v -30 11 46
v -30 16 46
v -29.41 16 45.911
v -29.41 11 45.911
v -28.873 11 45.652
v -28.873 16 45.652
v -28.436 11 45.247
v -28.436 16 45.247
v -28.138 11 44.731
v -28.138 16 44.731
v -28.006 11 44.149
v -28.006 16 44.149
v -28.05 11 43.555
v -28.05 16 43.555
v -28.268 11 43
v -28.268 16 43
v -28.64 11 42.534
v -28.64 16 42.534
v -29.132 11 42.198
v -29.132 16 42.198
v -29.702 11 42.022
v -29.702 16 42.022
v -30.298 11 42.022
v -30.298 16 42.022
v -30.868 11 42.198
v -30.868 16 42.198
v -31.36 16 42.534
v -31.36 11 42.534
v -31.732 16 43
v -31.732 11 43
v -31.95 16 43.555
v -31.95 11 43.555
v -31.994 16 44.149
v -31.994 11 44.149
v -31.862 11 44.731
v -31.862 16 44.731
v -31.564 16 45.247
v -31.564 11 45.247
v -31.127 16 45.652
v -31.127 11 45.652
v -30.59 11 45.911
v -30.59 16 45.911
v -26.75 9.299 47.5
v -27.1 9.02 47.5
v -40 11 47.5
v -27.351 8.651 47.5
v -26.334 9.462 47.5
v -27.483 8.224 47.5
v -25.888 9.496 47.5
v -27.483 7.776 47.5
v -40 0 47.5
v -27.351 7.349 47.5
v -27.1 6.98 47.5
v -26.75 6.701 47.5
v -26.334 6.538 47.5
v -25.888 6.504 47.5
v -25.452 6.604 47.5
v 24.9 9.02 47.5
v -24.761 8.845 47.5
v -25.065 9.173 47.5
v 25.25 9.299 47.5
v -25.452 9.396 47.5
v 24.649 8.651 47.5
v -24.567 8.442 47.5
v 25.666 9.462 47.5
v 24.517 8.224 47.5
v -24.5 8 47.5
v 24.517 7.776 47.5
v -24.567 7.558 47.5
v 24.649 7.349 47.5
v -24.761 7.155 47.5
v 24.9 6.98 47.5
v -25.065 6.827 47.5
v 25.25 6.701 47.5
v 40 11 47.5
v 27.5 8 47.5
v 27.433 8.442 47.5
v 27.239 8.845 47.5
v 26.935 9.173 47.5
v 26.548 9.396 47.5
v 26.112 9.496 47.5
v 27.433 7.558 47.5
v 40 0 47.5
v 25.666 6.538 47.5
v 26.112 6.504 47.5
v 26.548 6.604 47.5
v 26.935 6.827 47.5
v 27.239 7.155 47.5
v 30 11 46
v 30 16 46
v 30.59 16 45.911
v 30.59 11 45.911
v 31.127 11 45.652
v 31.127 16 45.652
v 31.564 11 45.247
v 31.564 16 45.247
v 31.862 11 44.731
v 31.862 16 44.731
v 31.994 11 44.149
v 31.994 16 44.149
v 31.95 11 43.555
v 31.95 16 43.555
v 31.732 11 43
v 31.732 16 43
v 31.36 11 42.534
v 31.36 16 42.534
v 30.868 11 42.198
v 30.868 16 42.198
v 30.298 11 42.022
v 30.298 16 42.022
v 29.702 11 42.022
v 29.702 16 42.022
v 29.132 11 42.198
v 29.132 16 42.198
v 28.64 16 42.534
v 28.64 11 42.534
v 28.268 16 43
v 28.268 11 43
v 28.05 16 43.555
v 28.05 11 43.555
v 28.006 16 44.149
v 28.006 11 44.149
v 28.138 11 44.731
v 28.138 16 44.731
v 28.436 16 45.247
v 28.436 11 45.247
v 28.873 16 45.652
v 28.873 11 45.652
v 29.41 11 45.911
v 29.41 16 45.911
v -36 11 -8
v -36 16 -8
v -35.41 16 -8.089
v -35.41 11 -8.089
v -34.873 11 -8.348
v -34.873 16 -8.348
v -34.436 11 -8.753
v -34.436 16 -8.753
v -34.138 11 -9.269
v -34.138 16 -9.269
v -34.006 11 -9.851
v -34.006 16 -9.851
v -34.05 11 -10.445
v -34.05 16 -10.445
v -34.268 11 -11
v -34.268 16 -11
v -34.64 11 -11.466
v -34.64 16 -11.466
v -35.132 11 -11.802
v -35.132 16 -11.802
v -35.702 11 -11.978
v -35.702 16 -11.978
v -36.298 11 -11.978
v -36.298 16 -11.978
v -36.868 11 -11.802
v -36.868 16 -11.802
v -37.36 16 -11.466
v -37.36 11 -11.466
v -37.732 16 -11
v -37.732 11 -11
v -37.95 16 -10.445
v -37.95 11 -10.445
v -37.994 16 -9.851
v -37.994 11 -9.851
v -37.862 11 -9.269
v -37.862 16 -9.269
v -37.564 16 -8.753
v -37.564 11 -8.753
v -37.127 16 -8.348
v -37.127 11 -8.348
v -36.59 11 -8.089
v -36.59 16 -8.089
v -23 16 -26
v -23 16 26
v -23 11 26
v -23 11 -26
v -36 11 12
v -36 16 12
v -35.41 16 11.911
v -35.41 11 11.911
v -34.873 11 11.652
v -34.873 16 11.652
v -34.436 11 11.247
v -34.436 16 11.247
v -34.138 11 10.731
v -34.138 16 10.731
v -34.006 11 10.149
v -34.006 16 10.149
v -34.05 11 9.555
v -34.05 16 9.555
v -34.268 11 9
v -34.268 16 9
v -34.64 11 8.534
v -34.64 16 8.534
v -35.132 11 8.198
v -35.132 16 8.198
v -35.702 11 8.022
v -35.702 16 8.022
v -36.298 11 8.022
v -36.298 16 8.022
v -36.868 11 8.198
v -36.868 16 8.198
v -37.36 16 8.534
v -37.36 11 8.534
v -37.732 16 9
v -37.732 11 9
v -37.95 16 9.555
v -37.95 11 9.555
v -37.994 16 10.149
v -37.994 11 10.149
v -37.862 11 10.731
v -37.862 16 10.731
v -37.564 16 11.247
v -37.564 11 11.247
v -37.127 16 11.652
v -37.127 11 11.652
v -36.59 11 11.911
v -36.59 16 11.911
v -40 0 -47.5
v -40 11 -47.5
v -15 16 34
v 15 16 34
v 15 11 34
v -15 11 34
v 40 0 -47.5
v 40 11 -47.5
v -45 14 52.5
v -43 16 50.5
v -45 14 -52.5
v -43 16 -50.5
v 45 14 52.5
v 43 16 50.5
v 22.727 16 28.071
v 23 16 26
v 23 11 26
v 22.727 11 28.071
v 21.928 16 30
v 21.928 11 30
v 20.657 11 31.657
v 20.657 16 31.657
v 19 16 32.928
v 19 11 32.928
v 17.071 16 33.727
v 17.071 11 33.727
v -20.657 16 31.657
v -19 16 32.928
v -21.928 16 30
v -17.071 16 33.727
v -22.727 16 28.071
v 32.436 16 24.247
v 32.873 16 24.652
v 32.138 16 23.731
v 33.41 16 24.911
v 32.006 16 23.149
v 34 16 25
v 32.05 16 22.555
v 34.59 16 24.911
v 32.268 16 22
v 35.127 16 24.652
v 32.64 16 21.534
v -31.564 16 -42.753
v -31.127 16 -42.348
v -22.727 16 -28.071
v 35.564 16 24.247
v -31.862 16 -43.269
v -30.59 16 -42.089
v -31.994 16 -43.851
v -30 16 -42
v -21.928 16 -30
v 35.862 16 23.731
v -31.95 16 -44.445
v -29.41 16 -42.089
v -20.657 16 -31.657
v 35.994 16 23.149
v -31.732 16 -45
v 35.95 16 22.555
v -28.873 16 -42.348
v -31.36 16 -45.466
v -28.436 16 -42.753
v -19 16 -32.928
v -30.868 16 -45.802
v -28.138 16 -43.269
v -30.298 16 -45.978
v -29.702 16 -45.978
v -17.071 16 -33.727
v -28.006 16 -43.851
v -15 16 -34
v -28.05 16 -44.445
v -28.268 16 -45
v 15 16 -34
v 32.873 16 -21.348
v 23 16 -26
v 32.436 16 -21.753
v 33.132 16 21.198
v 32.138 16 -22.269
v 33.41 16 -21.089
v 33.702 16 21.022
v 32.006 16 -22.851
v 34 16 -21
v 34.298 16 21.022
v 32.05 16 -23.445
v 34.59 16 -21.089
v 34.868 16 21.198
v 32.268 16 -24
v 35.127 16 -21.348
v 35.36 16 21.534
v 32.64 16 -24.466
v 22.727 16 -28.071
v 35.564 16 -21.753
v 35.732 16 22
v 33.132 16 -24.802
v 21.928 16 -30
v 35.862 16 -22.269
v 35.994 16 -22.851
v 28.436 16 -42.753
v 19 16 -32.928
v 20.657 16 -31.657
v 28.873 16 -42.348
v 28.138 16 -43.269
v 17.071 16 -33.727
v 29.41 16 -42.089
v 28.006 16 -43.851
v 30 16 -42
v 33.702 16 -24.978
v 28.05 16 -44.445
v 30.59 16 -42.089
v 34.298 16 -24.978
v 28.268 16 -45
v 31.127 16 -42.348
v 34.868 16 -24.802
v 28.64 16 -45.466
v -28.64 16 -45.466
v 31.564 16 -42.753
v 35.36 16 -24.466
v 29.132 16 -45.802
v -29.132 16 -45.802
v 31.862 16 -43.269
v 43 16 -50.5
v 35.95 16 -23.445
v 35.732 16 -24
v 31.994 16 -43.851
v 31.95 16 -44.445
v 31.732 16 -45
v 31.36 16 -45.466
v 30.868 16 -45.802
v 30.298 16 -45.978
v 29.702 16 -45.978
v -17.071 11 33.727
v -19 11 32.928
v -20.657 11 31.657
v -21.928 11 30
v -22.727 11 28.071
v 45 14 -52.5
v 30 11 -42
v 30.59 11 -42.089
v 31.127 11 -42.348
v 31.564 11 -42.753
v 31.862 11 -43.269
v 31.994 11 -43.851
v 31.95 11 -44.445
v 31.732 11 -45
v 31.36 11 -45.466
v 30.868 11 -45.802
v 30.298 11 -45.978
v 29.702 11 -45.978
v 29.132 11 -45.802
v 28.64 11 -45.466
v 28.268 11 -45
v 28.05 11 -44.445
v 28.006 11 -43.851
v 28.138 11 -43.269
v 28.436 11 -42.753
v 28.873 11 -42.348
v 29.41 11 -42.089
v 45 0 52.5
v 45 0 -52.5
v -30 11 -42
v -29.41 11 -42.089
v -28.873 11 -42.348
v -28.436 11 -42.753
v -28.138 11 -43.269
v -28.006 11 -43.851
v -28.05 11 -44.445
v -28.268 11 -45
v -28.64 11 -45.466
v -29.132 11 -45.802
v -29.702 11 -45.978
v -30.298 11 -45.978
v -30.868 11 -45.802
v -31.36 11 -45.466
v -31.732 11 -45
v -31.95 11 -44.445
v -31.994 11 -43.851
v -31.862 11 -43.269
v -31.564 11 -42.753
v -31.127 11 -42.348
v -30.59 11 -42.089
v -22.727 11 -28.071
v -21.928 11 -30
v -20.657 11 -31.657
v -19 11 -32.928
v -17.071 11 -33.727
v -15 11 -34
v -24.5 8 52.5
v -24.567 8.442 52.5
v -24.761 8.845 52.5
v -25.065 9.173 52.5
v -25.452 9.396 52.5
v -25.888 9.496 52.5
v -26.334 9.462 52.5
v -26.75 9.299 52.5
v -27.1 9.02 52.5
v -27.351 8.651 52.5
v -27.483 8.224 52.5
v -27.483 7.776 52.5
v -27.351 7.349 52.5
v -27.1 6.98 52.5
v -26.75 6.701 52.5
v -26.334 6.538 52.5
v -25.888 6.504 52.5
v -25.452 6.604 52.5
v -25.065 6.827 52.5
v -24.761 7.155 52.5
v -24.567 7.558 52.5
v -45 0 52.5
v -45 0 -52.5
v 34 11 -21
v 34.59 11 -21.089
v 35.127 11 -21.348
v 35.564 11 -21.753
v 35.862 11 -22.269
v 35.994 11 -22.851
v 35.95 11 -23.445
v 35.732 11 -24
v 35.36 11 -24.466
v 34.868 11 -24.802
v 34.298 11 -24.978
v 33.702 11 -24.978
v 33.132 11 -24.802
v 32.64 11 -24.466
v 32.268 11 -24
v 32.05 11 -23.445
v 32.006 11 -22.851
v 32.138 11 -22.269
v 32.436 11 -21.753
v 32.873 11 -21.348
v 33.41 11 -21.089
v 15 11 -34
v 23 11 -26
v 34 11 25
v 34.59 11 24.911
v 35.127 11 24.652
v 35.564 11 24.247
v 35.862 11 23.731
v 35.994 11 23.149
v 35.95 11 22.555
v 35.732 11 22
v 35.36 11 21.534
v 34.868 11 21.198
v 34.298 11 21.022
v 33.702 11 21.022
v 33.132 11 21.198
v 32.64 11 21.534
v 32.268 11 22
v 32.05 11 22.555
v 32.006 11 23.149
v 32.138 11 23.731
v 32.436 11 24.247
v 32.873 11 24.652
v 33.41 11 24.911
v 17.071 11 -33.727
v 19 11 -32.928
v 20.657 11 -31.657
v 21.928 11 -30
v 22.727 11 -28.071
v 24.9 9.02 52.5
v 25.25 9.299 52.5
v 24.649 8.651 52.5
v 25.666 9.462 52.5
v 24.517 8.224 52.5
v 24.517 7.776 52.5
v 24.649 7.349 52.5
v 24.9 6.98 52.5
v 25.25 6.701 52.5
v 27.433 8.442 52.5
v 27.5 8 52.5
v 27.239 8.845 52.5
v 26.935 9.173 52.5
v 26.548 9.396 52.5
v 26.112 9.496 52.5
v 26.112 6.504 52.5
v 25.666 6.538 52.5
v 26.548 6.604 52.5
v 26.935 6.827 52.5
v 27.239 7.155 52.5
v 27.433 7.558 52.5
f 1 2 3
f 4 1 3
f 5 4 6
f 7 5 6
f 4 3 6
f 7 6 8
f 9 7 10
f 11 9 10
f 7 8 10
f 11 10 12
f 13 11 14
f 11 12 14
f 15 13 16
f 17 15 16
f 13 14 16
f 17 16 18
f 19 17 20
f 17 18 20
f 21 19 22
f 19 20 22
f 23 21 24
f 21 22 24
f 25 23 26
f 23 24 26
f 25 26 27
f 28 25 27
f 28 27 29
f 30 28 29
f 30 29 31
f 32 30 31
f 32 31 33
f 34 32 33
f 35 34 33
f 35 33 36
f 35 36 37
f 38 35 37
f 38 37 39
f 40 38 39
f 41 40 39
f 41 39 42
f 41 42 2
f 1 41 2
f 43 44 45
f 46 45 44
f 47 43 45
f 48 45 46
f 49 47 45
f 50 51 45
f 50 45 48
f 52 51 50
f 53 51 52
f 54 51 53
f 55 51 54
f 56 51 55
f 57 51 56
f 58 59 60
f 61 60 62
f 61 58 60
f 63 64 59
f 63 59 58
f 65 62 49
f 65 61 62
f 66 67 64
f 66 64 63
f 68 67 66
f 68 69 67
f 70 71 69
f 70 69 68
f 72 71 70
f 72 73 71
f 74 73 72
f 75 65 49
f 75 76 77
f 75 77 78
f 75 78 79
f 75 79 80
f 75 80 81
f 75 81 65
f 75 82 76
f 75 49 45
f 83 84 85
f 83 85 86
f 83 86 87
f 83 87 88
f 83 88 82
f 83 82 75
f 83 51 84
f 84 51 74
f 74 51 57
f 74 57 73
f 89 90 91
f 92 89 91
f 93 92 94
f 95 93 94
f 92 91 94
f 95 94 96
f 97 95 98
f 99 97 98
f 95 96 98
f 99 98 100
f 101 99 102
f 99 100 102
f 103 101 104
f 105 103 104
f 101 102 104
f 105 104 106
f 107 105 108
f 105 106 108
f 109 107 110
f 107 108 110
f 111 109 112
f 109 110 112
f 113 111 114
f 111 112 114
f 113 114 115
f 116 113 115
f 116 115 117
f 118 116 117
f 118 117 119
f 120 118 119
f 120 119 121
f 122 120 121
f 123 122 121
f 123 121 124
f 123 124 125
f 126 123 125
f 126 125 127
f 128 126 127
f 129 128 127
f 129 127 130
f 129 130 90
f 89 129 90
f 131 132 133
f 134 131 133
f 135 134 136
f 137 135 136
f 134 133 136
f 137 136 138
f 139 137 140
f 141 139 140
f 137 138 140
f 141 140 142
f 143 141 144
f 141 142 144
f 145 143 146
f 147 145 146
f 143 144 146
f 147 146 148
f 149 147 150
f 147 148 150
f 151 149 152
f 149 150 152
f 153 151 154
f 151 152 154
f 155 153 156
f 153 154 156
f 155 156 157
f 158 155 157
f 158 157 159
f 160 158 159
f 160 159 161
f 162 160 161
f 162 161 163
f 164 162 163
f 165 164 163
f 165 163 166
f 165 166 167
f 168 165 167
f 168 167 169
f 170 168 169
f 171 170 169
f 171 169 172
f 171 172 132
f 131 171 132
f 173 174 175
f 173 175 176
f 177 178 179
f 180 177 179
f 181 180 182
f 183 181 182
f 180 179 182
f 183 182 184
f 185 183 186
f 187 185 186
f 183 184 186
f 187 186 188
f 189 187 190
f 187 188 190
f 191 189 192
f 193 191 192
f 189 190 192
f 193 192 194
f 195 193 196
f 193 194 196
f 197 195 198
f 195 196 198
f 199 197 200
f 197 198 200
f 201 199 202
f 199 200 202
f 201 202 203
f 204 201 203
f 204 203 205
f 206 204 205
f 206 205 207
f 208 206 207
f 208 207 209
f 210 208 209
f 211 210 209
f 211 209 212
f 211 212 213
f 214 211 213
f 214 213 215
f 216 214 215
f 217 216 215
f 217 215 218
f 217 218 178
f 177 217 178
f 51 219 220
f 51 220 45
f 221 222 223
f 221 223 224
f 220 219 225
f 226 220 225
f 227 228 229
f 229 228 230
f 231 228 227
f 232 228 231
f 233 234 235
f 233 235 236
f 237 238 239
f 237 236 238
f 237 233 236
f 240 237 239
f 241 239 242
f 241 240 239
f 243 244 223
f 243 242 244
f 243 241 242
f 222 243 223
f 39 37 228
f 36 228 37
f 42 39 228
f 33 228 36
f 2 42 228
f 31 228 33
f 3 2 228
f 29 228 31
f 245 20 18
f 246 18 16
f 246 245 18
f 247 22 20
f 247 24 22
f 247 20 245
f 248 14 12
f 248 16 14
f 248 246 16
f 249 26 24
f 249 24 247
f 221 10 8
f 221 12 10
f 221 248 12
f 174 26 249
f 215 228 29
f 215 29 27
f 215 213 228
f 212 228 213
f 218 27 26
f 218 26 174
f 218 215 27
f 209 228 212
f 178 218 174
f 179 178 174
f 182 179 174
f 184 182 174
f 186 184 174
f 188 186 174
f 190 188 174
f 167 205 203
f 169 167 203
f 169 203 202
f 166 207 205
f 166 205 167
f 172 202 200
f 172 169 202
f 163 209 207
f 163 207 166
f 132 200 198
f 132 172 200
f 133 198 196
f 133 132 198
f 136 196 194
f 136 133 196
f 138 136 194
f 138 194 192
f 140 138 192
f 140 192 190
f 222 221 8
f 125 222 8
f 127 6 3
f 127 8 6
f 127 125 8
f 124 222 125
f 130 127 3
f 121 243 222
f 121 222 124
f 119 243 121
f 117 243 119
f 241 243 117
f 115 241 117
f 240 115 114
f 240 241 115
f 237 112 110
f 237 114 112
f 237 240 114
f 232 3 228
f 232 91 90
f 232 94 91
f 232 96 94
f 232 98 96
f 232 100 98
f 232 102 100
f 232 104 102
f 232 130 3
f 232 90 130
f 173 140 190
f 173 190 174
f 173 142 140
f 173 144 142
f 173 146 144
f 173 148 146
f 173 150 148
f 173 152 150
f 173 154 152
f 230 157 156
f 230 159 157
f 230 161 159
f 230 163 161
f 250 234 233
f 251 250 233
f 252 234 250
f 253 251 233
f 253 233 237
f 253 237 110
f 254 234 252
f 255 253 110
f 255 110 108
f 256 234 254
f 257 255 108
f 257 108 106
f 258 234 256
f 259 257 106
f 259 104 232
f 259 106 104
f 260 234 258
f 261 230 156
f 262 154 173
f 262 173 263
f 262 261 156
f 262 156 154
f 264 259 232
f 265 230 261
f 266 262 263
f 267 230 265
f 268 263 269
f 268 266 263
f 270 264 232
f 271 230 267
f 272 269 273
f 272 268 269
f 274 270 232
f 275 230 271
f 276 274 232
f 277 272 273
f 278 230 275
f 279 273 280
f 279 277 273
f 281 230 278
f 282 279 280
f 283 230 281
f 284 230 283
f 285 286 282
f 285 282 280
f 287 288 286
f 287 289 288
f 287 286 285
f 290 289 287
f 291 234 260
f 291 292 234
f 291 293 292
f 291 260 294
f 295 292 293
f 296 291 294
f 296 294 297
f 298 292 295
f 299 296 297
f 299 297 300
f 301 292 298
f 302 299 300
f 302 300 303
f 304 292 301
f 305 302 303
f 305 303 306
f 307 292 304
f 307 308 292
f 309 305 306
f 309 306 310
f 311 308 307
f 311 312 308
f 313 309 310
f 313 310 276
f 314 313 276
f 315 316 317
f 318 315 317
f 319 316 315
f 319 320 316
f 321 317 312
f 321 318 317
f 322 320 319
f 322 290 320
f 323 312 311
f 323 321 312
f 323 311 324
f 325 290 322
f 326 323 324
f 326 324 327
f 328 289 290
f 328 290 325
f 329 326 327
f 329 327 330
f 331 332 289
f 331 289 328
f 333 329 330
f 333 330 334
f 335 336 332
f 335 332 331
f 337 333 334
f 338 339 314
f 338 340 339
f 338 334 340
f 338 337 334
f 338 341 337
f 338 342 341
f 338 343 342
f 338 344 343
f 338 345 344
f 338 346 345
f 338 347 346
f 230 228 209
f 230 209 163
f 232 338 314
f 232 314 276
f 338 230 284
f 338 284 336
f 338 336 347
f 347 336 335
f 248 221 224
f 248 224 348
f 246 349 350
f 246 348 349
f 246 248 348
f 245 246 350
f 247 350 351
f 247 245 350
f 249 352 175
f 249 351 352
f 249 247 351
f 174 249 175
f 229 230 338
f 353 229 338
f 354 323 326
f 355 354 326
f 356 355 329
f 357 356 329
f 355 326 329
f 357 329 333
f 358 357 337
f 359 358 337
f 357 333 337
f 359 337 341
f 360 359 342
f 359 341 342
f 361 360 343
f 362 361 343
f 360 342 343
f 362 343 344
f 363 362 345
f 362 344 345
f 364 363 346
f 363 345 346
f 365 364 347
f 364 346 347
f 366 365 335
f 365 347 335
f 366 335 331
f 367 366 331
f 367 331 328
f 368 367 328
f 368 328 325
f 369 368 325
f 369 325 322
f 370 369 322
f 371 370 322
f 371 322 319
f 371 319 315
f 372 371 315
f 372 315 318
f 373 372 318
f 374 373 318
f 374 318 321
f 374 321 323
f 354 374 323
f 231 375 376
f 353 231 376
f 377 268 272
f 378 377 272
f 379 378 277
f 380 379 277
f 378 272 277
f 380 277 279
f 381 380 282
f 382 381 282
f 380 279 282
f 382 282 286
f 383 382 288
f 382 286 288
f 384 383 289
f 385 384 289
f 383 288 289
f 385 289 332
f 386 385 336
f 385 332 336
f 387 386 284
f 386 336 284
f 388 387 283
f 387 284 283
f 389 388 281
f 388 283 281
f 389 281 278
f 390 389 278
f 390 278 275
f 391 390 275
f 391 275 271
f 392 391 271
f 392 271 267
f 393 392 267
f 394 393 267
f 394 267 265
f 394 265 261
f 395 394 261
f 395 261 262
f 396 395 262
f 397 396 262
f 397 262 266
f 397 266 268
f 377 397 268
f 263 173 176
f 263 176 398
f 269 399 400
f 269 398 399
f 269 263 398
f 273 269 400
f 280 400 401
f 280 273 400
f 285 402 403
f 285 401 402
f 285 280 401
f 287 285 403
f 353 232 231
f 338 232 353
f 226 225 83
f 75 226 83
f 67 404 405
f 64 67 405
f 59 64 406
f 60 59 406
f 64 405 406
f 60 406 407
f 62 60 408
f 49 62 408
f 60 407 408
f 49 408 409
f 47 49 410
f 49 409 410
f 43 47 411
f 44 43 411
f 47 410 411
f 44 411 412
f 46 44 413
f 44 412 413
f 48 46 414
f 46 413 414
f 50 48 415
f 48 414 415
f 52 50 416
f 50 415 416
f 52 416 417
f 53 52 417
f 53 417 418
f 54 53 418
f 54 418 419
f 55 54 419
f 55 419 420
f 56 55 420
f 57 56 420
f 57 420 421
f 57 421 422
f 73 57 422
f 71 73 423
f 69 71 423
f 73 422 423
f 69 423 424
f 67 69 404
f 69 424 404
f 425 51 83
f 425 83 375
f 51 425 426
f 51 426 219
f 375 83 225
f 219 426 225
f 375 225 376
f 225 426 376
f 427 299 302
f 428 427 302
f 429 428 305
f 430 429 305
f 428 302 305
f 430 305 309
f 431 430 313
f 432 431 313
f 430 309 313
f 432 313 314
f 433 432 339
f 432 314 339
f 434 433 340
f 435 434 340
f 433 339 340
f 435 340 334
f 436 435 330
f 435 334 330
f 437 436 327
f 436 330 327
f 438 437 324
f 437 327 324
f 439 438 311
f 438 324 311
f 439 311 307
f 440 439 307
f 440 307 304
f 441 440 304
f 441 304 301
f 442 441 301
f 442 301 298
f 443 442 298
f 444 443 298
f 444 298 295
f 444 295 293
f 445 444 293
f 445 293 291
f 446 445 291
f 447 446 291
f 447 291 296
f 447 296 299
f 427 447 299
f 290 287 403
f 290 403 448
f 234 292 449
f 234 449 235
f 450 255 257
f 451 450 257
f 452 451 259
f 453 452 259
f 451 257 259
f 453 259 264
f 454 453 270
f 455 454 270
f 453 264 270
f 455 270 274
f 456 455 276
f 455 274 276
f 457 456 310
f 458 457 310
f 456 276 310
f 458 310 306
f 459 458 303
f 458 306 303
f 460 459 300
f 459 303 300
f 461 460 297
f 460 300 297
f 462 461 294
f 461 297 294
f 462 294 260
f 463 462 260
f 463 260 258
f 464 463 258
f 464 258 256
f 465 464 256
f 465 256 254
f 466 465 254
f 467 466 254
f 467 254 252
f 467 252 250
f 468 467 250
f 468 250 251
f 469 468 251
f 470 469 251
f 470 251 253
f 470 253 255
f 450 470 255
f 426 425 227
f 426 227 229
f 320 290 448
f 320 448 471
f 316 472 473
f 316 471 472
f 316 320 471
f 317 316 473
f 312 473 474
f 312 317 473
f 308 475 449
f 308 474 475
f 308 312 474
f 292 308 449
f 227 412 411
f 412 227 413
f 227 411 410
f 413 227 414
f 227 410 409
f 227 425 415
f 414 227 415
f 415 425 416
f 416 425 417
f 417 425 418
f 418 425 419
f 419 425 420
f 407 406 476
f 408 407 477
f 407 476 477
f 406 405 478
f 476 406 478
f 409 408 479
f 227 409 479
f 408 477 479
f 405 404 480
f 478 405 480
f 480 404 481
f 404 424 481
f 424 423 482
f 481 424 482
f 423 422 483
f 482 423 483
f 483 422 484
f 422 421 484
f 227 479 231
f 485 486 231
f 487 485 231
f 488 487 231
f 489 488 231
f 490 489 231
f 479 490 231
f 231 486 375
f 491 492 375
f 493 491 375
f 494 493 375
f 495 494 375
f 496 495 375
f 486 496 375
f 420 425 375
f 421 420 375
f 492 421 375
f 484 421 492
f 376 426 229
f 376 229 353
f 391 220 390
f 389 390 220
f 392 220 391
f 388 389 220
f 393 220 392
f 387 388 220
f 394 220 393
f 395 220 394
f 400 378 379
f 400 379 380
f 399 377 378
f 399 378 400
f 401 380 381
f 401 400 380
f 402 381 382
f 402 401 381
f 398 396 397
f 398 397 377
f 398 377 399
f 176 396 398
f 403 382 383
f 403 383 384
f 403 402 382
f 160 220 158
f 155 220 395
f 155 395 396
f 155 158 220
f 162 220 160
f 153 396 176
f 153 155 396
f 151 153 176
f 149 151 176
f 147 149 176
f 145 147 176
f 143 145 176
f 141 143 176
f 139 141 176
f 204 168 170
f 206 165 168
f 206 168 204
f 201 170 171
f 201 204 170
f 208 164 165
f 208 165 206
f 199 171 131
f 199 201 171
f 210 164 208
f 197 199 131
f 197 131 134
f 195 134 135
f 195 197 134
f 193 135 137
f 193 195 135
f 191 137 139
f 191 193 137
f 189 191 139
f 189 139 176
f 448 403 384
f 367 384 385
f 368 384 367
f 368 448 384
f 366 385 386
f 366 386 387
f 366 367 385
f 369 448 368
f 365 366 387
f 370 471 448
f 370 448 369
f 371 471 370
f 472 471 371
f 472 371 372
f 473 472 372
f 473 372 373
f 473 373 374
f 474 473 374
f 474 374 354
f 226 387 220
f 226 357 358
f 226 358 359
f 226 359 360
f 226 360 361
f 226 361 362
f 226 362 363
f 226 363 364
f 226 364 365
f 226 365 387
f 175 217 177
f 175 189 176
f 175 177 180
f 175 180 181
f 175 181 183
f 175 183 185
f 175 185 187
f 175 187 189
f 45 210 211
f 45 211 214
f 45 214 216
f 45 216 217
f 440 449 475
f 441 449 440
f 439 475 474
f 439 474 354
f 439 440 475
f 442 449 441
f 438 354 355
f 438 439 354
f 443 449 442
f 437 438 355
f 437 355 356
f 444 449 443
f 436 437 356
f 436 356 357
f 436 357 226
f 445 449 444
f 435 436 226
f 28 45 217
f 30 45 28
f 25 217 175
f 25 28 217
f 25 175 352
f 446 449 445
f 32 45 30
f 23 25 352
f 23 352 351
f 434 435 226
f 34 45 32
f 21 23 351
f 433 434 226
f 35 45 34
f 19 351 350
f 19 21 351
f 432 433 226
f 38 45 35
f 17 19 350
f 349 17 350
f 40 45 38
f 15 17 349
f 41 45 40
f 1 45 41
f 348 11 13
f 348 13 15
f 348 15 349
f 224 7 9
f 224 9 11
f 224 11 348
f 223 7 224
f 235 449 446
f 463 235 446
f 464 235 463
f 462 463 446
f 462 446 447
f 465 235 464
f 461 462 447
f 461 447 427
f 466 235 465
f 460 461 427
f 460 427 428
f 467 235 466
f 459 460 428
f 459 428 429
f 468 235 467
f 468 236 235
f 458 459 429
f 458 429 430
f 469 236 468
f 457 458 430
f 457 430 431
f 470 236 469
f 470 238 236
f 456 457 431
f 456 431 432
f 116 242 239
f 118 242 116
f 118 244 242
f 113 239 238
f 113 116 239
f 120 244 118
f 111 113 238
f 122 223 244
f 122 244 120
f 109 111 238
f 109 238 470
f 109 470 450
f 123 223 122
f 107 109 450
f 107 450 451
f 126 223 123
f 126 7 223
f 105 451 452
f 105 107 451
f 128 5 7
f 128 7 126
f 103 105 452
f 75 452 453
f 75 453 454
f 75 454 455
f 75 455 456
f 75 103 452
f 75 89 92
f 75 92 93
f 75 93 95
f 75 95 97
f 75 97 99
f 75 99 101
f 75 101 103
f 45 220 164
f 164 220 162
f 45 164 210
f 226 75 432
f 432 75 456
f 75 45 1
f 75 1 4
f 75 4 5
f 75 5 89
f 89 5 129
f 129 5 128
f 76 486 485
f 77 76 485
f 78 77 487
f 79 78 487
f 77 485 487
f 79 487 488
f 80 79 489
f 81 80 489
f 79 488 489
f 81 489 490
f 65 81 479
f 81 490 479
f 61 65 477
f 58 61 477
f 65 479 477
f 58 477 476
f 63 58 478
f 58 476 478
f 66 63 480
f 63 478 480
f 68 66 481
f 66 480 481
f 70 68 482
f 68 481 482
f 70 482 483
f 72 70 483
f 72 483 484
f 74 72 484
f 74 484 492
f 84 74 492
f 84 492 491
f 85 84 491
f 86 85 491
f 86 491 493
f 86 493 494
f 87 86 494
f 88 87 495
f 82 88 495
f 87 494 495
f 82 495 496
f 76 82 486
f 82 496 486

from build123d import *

# Parameters (mm, degrees)
SKETCH1_W           = 90
SKETCH1_H           = 105
BOSS_EXTRUDE1_DEPTH = 16
CHAMFER1_SIZE       = 2
SKETCH3_W           = 80
SKETCH3_H           = 95
CUT_EXTRUDE1_DEPTH  = 11
CUT_EXTRUDE2_DEPTH  = 71.973586636
SKETCH5_R           = 2
CUT_EXTRUDE3_DEPTH  = 71.973586636
SKETCH6_R           = 1.5
CUT_EXTRUDE4_DEPTH  = 5


with BuildPart() as part:
    # Sketch1 → Boss-Extrude1 (new body)
    with BuildSketch(Plane(origin=(0, 0, 0), x_dir=(1, 0, 0), z_dir=(0, 1, 0))):
        Rectangle(SKETCH1_W, SKETCH1_H)
    extrude(amount=BOSS_EXTRUDE1_DEPTH)

    # Chamfer1
    chamfer1_edges = [part.edges().sort_by_distance(p)[0] for p in [
        (-45, 16, 0),
        (0, 16, 52.5),
        (45, 16, 0),
        (0, 16, -52.5),
    ]]
    chamfer(chamfer1_edges, length=CHAMFER1_SIZE)

    # Sketch3 → Cut-Extrude1 (cut)
    with BuildSketch(Plane.XZ):
        Rectangle(SKETCH3_W, SKETCH3_H)
    extrude(amount=-CUT_EXTRUDE1_DEPTH, mode=Mode.SUBTRACT)

    # Sketch4 → Cut-Extrude2 (cut, through all)
    with BuildSketch(Plane(origin=(0, 16, 0), x_dir=(1, 0, 0), z_dir=(0, 1, 0))):
        with BuildLine():
            Line((-15, 34), (15, 34))
            ThreePointArc((15, 34), (20.656854249, 31.656854249), (23, 26))
            Line((23, 26), (23, -26))
            ThreePointArc((23, -26), (20.656854249, -31.656854249), (15, -34))
            Line((15, -34), (-15, -34))
            ThreePointArc((-15, -34), (-20.656854249, -31.656854249), (-23, -26))
            Line((-23, -26), (-23, 26))
            ThreePointArc((-23, 26), (-20.656854249, 31.656854249), (-15, 34))
        make_face()
    extrude(amount=-CUT_EXTRUDE2_DEPTH, mode=Mode.SUBTRACT)

    # Sketch5 → Cut-Extrude3 (cut, through all)
    with BuildSketch(Plane(origin=(0, 16, 0), x_dir=(1, 0, 0), z_dir=(0, 1, 0))):
        with Locations(Location((-30, 44, 0), (0, 0, 270))):
            Circle(SKETCH5_R)
        with Locations(Location((-30, -44, 0), (0, 0, 270))):
            Circle(SKETCH5_R)
        with Locations(Location((30, -44, 0), (0, 0, 270))):
            Circle(SKETCH5_R)
        with Locations(Location((30, 44, 0), (0, 0, 270))):
            Circle(SKETCH5_R)
        with Locations(Location((-36, -10, 0), (0, 0, 270))):
            Circle(SKETCH5_R)
        with Locations(Location((34, 23, 0), (0, 0, 270))):
            Circle(SKETCH5_R)
        with Locations(Location((-36, 10, 0), (0, 0, 270))):
            Circle(SKETCH5_R)
        with Locations(Location((34, -23, 0), (0, 0, 270))):
            Circle(SKETCH5_R)
    extrude(amount=-CUT_EXTRUDE3_DEPTH, mode=Mode.SUBTRACT)

    # Sketch6 → Cut-Extrude4 (cut)
    with BuildSketch(Plane.XY.offset(52.5)):
        with Locations((-26, 8)):
            Circle(SKETCH6_R)
        with Locations((26, 8)):
            Circle(SKETCH6_R)
    extrude(amount=-CUT_EXTRUDE4_DEPTH, mode=Mode.SUBTRACT)


solid = part.part
